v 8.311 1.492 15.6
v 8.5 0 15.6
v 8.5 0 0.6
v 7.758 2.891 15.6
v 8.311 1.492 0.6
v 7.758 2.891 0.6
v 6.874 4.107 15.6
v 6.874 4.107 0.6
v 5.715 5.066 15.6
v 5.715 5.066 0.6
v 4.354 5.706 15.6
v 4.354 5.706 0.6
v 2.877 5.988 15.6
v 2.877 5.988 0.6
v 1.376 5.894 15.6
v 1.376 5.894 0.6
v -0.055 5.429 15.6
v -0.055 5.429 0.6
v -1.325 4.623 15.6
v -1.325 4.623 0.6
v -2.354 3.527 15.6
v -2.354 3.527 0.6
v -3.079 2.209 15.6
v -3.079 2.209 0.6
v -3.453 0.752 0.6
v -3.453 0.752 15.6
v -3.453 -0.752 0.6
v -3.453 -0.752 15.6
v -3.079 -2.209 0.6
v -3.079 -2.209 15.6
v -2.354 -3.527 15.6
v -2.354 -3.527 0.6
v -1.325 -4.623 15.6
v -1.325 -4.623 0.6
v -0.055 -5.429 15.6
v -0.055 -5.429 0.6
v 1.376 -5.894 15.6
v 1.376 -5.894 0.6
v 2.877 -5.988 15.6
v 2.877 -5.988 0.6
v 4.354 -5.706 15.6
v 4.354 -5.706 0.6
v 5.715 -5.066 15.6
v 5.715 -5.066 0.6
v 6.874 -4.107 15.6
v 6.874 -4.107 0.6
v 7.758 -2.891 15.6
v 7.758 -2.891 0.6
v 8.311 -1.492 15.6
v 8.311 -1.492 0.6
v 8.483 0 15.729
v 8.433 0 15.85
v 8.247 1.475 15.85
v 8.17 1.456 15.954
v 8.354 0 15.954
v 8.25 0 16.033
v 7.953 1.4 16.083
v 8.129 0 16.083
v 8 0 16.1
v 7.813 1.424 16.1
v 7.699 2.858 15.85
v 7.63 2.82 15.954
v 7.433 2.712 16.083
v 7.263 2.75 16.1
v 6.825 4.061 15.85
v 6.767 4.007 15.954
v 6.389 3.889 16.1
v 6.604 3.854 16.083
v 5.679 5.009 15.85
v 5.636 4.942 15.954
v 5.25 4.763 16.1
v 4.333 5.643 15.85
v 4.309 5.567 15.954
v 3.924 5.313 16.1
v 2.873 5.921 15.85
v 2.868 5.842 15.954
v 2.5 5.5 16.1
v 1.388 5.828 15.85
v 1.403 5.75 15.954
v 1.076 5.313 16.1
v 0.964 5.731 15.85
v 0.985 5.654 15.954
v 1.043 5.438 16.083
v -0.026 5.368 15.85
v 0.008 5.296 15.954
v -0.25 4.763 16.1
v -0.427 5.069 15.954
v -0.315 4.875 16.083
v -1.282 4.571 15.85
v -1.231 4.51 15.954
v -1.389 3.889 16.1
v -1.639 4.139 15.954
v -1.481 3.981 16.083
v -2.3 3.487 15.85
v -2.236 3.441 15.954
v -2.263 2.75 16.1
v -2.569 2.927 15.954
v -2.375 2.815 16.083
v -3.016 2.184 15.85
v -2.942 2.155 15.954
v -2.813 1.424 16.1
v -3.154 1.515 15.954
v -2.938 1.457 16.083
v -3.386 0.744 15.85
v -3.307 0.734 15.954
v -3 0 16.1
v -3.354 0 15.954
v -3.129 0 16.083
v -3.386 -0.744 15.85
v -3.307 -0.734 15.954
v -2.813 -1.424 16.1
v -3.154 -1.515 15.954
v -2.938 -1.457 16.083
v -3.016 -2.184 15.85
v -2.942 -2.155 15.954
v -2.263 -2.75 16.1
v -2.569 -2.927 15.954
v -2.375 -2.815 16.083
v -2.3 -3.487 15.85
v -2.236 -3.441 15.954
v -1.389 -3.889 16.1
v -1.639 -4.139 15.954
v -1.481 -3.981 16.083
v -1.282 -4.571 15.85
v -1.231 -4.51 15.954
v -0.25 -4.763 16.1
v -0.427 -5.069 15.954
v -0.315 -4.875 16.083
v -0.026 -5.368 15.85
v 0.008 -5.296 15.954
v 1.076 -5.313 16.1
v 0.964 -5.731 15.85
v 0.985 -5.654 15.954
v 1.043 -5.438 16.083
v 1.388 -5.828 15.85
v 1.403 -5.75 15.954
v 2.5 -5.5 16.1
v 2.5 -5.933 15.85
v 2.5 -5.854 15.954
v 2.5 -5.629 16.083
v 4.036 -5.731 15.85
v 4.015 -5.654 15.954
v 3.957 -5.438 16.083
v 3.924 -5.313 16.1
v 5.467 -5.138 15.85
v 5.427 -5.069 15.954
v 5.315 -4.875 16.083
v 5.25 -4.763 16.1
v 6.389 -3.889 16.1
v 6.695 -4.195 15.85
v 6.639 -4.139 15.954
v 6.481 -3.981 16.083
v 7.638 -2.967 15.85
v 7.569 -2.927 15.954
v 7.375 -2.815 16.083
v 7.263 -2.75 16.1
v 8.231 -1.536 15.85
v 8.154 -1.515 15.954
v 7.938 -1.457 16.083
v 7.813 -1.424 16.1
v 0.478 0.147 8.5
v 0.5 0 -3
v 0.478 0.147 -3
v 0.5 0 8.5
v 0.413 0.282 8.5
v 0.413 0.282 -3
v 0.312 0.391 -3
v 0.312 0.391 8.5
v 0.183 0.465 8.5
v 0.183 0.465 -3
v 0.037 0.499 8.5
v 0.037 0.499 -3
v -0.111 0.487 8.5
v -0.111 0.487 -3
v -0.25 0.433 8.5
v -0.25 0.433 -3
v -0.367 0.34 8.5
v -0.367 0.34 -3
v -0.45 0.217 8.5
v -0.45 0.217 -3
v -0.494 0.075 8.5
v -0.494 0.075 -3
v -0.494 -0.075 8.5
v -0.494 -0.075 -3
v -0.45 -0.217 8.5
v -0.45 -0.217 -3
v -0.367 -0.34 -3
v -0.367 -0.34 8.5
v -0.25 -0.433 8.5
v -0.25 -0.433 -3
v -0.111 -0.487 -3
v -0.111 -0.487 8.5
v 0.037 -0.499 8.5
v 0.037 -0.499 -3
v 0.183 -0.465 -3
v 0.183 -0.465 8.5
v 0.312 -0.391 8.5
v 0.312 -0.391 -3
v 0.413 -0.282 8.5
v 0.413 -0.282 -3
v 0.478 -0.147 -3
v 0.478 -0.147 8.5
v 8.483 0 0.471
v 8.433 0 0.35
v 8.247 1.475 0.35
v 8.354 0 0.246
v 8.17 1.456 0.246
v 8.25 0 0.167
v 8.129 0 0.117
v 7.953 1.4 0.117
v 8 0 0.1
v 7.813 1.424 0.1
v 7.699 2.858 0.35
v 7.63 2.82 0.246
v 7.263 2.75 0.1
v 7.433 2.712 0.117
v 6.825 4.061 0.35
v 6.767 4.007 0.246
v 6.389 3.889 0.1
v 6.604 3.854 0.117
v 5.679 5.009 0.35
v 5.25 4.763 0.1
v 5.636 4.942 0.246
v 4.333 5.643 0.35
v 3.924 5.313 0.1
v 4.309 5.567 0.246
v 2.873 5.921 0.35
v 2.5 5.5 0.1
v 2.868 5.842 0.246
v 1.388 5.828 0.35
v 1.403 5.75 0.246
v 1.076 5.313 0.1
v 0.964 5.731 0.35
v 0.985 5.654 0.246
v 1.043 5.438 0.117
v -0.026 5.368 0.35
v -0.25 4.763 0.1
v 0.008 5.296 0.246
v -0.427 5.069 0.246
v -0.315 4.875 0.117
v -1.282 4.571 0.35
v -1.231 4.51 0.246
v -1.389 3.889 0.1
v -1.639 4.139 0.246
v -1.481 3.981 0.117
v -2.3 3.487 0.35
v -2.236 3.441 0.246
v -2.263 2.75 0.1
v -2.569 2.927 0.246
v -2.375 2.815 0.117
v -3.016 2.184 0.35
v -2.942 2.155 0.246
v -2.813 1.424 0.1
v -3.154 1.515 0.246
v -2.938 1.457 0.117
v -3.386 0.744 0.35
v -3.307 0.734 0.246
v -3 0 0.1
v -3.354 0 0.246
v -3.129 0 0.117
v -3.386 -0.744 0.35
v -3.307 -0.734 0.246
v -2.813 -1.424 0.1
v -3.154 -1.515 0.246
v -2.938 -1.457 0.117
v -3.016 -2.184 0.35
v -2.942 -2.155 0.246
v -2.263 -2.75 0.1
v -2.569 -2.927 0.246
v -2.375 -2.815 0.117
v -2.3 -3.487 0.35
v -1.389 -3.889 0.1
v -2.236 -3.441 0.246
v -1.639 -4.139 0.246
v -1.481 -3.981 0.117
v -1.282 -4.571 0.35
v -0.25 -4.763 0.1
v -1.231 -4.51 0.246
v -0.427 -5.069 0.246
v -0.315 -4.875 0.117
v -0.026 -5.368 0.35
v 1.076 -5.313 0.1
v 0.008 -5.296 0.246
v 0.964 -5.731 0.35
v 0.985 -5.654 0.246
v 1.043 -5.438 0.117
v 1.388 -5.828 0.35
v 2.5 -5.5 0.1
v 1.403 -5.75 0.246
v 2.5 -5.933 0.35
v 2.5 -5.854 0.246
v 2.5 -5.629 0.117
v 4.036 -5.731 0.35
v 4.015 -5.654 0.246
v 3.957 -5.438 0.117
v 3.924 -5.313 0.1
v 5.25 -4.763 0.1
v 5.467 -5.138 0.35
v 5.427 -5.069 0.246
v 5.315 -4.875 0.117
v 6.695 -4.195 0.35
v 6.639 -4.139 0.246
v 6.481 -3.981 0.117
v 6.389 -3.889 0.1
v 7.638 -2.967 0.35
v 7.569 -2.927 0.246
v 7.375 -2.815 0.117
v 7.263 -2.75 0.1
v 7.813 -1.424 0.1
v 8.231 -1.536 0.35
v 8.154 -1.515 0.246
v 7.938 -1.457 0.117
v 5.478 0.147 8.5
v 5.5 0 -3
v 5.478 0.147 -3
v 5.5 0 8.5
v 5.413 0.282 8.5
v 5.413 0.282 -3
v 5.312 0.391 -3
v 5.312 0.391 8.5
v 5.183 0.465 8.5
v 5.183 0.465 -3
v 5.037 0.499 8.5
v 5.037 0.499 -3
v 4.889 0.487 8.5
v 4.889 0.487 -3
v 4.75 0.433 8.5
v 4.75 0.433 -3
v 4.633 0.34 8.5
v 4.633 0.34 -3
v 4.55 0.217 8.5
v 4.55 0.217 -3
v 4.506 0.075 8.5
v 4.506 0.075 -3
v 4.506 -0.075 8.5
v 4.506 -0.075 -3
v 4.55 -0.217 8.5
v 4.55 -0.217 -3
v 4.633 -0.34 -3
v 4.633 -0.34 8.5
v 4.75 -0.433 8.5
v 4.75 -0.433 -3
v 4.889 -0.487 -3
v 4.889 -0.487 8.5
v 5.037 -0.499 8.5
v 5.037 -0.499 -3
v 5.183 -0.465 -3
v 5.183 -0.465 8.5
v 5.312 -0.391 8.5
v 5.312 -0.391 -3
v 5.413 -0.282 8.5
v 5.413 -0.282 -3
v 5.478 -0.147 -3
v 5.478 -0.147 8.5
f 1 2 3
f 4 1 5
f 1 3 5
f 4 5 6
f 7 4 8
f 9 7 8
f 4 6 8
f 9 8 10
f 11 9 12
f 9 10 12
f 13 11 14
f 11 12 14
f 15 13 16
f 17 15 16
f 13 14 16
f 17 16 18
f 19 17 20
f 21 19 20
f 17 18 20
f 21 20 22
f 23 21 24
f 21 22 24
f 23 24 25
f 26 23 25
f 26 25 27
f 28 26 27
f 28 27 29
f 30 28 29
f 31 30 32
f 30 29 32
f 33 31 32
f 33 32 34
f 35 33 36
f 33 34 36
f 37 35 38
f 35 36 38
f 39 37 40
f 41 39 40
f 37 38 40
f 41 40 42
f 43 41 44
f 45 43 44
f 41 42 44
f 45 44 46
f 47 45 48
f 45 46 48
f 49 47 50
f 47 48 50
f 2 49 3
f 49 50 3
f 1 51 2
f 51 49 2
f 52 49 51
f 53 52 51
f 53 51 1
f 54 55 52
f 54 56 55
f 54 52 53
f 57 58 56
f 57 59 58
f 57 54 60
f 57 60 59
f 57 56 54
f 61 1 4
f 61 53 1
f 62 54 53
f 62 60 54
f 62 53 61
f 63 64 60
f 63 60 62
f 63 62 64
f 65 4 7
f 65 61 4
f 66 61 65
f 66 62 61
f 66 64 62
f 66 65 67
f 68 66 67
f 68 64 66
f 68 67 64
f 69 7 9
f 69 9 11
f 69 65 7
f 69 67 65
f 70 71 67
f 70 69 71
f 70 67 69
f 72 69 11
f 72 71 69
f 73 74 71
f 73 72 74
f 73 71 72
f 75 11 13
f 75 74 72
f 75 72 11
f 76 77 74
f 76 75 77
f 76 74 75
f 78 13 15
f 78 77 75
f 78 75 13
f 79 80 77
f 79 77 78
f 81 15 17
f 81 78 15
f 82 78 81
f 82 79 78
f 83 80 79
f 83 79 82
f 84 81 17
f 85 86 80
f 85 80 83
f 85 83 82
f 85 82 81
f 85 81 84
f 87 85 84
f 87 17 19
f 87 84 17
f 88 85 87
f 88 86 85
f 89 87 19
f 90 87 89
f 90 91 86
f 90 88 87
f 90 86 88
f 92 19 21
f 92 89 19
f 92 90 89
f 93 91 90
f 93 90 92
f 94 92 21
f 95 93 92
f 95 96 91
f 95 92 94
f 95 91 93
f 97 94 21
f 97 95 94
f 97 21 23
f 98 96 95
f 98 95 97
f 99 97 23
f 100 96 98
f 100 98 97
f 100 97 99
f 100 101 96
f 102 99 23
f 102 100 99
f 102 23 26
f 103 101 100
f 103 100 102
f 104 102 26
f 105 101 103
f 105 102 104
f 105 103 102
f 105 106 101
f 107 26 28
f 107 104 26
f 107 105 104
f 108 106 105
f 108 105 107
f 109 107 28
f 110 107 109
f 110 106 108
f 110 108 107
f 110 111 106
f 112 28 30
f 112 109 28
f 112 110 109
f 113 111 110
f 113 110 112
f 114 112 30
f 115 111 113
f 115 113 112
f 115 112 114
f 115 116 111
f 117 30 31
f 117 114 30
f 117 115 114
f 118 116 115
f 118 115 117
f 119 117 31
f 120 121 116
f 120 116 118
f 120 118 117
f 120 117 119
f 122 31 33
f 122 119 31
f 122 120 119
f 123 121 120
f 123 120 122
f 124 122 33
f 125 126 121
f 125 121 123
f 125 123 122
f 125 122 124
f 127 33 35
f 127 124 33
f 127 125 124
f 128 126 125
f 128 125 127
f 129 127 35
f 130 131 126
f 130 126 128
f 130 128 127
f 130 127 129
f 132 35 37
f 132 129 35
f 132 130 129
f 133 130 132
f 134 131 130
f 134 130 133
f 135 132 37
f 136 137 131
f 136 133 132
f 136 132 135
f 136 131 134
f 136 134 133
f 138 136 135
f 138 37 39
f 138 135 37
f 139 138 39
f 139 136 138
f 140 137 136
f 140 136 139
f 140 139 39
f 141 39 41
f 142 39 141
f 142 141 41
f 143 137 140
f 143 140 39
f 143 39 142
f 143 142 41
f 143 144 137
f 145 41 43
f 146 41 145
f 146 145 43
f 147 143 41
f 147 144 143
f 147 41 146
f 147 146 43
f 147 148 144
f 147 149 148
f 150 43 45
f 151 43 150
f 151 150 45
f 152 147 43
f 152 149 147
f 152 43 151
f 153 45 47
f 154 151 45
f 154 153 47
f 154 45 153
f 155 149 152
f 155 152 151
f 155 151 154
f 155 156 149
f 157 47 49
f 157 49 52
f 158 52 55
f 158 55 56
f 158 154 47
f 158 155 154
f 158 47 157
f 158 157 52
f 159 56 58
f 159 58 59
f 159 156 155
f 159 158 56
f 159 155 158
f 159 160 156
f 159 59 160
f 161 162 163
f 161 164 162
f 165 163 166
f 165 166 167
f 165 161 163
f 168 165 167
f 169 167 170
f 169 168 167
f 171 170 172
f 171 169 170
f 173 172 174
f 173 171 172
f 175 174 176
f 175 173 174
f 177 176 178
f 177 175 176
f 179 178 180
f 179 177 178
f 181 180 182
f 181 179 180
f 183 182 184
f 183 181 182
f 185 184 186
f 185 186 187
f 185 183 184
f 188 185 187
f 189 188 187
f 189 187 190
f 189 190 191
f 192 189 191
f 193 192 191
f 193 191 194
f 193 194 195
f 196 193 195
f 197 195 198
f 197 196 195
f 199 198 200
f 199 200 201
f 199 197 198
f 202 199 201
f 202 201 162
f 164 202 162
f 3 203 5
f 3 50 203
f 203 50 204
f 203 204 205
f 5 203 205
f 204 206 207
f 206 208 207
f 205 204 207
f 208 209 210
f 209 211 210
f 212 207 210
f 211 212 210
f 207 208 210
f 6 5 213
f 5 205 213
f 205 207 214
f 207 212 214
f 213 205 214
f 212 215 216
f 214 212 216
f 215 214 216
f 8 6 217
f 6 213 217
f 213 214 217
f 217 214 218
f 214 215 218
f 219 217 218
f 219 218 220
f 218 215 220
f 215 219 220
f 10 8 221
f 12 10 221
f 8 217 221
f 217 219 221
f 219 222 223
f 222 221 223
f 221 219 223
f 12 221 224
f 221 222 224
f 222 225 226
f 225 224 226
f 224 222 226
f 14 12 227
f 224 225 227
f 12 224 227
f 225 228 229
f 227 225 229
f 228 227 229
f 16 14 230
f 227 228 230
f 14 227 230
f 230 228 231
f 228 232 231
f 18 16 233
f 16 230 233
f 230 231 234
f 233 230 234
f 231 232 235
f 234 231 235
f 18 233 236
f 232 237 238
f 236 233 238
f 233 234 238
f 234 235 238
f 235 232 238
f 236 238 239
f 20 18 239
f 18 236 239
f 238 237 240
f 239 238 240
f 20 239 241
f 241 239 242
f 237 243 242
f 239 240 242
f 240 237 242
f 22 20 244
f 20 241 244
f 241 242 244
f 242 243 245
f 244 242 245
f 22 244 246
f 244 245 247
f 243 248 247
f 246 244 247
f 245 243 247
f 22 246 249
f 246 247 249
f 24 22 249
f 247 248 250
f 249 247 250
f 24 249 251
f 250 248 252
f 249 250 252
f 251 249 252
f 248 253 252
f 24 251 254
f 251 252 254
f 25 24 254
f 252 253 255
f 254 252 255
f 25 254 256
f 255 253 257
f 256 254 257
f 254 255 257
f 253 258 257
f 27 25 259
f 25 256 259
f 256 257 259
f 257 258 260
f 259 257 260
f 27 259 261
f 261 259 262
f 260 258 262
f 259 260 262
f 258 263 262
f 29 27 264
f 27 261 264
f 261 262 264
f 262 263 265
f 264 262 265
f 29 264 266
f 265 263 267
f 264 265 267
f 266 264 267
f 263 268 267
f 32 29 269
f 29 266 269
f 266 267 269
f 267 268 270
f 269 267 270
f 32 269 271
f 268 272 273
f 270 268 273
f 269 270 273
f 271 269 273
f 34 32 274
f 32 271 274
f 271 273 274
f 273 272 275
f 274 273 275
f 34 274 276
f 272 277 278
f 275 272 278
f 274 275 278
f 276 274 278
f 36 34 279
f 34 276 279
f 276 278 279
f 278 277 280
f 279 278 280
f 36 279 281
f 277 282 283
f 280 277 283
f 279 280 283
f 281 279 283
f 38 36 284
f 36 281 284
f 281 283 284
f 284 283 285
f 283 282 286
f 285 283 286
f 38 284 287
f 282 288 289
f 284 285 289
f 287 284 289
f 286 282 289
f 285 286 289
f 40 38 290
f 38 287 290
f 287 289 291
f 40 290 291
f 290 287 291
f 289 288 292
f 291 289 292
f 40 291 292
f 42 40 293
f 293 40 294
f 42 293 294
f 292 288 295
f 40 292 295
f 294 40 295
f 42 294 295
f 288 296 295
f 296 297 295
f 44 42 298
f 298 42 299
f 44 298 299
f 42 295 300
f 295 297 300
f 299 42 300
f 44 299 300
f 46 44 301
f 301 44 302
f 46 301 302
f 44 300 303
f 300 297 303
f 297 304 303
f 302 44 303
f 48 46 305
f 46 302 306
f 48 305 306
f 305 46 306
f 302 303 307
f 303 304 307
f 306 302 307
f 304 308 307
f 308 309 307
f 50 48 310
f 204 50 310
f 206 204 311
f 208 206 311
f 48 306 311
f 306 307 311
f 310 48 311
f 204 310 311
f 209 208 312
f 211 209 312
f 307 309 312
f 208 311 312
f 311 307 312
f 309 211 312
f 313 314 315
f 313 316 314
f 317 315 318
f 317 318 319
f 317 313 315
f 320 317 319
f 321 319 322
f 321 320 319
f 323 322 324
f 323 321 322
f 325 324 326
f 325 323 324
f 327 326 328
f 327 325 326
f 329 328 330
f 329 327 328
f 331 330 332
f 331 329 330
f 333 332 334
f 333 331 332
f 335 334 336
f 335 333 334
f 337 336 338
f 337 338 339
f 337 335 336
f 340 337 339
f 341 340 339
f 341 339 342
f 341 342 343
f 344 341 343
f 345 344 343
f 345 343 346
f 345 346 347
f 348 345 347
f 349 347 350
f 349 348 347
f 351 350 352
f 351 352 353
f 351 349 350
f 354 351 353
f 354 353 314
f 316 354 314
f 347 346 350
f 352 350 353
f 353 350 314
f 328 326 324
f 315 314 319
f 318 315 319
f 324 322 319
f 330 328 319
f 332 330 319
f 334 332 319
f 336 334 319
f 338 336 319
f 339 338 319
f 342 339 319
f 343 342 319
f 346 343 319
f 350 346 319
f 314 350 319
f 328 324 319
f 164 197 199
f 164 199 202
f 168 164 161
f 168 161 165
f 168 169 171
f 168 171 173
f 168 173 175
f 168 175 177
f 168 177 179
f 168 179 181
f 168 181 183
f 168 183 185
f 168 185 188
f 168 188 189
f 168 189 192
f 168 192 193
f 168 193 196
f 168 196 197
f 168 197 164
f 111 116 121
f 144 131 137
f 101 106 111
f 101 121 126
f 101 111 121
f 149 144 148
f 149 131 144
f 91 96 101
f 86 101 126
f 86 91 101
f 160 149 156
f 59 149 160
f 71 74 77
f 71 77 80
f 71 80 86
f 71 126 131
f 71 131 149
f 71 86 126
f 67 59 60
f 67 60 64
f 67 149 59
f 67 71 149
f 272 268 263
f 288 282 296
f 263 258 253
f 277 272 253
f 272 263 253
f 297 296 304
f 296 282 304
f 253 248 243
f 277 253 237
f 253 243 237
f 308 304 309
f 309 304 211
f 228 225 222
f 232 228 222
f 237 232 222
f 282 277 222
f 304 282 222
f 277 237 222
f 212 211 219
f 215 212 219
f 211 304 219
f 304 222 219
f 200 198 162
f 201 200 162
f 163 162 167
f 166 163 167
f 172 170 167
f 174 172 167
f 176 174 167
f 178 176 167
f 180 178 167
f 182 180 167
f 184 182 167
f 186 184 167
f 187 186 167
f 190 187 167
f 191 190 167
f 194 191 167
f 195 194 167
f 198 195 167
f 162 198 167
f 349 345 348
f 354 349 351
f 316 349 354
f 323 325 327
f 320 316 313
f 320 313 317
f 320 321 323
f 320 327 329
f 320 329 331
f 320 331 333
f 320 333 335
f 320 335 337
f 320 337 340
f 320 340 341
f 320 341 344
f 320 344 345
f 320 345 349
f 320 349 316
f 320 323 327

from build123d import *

# Parameters (mm, degrees)
SKETCH001_R       = 0.5
PAD001_DEPTH      = 8
PAD001_DEPTH_BACK = 3.5
SKETCH_R          = 6
PAD_DEPTH         = 16
FILLET_R          = 0.5


with BuildPart() as pad001:
    # Sketch001 → Pad001 (new body, two sides)
    with BuildSketch(Plane.XY.offset(0.5)) as pad001_sk:
        Circle(SKETCH001_R)
        with Locations((5, 0)):
            Circle(SKETCH001_R)
    extrude(amount=PAD001_DEPTH)
    extrude(pad001_sk.sketch, amount=-PAD001_DEPTH_BACK)


with BuildPart() as fillet_body:
    # Sketch → Pad (new body)
    with BuildSketch(Plane.XY.offset(0.1)):
        with Locations((2.5, 0)):
            Circle(SKETCH_R)
    extrude(amount=PAD_DEPTH)

    # Fillet
    fillet_edges = [fillet_body.edges().sort_by_distance(p)[0] for p in [
        (-3.5, 0, 0.1),
        (-3.5, 0, 16.1),
    ]]
    fillet(fillet_edges, radius=FILLET_R)


solid = Compound([pad001.part, fillet_body.part])
